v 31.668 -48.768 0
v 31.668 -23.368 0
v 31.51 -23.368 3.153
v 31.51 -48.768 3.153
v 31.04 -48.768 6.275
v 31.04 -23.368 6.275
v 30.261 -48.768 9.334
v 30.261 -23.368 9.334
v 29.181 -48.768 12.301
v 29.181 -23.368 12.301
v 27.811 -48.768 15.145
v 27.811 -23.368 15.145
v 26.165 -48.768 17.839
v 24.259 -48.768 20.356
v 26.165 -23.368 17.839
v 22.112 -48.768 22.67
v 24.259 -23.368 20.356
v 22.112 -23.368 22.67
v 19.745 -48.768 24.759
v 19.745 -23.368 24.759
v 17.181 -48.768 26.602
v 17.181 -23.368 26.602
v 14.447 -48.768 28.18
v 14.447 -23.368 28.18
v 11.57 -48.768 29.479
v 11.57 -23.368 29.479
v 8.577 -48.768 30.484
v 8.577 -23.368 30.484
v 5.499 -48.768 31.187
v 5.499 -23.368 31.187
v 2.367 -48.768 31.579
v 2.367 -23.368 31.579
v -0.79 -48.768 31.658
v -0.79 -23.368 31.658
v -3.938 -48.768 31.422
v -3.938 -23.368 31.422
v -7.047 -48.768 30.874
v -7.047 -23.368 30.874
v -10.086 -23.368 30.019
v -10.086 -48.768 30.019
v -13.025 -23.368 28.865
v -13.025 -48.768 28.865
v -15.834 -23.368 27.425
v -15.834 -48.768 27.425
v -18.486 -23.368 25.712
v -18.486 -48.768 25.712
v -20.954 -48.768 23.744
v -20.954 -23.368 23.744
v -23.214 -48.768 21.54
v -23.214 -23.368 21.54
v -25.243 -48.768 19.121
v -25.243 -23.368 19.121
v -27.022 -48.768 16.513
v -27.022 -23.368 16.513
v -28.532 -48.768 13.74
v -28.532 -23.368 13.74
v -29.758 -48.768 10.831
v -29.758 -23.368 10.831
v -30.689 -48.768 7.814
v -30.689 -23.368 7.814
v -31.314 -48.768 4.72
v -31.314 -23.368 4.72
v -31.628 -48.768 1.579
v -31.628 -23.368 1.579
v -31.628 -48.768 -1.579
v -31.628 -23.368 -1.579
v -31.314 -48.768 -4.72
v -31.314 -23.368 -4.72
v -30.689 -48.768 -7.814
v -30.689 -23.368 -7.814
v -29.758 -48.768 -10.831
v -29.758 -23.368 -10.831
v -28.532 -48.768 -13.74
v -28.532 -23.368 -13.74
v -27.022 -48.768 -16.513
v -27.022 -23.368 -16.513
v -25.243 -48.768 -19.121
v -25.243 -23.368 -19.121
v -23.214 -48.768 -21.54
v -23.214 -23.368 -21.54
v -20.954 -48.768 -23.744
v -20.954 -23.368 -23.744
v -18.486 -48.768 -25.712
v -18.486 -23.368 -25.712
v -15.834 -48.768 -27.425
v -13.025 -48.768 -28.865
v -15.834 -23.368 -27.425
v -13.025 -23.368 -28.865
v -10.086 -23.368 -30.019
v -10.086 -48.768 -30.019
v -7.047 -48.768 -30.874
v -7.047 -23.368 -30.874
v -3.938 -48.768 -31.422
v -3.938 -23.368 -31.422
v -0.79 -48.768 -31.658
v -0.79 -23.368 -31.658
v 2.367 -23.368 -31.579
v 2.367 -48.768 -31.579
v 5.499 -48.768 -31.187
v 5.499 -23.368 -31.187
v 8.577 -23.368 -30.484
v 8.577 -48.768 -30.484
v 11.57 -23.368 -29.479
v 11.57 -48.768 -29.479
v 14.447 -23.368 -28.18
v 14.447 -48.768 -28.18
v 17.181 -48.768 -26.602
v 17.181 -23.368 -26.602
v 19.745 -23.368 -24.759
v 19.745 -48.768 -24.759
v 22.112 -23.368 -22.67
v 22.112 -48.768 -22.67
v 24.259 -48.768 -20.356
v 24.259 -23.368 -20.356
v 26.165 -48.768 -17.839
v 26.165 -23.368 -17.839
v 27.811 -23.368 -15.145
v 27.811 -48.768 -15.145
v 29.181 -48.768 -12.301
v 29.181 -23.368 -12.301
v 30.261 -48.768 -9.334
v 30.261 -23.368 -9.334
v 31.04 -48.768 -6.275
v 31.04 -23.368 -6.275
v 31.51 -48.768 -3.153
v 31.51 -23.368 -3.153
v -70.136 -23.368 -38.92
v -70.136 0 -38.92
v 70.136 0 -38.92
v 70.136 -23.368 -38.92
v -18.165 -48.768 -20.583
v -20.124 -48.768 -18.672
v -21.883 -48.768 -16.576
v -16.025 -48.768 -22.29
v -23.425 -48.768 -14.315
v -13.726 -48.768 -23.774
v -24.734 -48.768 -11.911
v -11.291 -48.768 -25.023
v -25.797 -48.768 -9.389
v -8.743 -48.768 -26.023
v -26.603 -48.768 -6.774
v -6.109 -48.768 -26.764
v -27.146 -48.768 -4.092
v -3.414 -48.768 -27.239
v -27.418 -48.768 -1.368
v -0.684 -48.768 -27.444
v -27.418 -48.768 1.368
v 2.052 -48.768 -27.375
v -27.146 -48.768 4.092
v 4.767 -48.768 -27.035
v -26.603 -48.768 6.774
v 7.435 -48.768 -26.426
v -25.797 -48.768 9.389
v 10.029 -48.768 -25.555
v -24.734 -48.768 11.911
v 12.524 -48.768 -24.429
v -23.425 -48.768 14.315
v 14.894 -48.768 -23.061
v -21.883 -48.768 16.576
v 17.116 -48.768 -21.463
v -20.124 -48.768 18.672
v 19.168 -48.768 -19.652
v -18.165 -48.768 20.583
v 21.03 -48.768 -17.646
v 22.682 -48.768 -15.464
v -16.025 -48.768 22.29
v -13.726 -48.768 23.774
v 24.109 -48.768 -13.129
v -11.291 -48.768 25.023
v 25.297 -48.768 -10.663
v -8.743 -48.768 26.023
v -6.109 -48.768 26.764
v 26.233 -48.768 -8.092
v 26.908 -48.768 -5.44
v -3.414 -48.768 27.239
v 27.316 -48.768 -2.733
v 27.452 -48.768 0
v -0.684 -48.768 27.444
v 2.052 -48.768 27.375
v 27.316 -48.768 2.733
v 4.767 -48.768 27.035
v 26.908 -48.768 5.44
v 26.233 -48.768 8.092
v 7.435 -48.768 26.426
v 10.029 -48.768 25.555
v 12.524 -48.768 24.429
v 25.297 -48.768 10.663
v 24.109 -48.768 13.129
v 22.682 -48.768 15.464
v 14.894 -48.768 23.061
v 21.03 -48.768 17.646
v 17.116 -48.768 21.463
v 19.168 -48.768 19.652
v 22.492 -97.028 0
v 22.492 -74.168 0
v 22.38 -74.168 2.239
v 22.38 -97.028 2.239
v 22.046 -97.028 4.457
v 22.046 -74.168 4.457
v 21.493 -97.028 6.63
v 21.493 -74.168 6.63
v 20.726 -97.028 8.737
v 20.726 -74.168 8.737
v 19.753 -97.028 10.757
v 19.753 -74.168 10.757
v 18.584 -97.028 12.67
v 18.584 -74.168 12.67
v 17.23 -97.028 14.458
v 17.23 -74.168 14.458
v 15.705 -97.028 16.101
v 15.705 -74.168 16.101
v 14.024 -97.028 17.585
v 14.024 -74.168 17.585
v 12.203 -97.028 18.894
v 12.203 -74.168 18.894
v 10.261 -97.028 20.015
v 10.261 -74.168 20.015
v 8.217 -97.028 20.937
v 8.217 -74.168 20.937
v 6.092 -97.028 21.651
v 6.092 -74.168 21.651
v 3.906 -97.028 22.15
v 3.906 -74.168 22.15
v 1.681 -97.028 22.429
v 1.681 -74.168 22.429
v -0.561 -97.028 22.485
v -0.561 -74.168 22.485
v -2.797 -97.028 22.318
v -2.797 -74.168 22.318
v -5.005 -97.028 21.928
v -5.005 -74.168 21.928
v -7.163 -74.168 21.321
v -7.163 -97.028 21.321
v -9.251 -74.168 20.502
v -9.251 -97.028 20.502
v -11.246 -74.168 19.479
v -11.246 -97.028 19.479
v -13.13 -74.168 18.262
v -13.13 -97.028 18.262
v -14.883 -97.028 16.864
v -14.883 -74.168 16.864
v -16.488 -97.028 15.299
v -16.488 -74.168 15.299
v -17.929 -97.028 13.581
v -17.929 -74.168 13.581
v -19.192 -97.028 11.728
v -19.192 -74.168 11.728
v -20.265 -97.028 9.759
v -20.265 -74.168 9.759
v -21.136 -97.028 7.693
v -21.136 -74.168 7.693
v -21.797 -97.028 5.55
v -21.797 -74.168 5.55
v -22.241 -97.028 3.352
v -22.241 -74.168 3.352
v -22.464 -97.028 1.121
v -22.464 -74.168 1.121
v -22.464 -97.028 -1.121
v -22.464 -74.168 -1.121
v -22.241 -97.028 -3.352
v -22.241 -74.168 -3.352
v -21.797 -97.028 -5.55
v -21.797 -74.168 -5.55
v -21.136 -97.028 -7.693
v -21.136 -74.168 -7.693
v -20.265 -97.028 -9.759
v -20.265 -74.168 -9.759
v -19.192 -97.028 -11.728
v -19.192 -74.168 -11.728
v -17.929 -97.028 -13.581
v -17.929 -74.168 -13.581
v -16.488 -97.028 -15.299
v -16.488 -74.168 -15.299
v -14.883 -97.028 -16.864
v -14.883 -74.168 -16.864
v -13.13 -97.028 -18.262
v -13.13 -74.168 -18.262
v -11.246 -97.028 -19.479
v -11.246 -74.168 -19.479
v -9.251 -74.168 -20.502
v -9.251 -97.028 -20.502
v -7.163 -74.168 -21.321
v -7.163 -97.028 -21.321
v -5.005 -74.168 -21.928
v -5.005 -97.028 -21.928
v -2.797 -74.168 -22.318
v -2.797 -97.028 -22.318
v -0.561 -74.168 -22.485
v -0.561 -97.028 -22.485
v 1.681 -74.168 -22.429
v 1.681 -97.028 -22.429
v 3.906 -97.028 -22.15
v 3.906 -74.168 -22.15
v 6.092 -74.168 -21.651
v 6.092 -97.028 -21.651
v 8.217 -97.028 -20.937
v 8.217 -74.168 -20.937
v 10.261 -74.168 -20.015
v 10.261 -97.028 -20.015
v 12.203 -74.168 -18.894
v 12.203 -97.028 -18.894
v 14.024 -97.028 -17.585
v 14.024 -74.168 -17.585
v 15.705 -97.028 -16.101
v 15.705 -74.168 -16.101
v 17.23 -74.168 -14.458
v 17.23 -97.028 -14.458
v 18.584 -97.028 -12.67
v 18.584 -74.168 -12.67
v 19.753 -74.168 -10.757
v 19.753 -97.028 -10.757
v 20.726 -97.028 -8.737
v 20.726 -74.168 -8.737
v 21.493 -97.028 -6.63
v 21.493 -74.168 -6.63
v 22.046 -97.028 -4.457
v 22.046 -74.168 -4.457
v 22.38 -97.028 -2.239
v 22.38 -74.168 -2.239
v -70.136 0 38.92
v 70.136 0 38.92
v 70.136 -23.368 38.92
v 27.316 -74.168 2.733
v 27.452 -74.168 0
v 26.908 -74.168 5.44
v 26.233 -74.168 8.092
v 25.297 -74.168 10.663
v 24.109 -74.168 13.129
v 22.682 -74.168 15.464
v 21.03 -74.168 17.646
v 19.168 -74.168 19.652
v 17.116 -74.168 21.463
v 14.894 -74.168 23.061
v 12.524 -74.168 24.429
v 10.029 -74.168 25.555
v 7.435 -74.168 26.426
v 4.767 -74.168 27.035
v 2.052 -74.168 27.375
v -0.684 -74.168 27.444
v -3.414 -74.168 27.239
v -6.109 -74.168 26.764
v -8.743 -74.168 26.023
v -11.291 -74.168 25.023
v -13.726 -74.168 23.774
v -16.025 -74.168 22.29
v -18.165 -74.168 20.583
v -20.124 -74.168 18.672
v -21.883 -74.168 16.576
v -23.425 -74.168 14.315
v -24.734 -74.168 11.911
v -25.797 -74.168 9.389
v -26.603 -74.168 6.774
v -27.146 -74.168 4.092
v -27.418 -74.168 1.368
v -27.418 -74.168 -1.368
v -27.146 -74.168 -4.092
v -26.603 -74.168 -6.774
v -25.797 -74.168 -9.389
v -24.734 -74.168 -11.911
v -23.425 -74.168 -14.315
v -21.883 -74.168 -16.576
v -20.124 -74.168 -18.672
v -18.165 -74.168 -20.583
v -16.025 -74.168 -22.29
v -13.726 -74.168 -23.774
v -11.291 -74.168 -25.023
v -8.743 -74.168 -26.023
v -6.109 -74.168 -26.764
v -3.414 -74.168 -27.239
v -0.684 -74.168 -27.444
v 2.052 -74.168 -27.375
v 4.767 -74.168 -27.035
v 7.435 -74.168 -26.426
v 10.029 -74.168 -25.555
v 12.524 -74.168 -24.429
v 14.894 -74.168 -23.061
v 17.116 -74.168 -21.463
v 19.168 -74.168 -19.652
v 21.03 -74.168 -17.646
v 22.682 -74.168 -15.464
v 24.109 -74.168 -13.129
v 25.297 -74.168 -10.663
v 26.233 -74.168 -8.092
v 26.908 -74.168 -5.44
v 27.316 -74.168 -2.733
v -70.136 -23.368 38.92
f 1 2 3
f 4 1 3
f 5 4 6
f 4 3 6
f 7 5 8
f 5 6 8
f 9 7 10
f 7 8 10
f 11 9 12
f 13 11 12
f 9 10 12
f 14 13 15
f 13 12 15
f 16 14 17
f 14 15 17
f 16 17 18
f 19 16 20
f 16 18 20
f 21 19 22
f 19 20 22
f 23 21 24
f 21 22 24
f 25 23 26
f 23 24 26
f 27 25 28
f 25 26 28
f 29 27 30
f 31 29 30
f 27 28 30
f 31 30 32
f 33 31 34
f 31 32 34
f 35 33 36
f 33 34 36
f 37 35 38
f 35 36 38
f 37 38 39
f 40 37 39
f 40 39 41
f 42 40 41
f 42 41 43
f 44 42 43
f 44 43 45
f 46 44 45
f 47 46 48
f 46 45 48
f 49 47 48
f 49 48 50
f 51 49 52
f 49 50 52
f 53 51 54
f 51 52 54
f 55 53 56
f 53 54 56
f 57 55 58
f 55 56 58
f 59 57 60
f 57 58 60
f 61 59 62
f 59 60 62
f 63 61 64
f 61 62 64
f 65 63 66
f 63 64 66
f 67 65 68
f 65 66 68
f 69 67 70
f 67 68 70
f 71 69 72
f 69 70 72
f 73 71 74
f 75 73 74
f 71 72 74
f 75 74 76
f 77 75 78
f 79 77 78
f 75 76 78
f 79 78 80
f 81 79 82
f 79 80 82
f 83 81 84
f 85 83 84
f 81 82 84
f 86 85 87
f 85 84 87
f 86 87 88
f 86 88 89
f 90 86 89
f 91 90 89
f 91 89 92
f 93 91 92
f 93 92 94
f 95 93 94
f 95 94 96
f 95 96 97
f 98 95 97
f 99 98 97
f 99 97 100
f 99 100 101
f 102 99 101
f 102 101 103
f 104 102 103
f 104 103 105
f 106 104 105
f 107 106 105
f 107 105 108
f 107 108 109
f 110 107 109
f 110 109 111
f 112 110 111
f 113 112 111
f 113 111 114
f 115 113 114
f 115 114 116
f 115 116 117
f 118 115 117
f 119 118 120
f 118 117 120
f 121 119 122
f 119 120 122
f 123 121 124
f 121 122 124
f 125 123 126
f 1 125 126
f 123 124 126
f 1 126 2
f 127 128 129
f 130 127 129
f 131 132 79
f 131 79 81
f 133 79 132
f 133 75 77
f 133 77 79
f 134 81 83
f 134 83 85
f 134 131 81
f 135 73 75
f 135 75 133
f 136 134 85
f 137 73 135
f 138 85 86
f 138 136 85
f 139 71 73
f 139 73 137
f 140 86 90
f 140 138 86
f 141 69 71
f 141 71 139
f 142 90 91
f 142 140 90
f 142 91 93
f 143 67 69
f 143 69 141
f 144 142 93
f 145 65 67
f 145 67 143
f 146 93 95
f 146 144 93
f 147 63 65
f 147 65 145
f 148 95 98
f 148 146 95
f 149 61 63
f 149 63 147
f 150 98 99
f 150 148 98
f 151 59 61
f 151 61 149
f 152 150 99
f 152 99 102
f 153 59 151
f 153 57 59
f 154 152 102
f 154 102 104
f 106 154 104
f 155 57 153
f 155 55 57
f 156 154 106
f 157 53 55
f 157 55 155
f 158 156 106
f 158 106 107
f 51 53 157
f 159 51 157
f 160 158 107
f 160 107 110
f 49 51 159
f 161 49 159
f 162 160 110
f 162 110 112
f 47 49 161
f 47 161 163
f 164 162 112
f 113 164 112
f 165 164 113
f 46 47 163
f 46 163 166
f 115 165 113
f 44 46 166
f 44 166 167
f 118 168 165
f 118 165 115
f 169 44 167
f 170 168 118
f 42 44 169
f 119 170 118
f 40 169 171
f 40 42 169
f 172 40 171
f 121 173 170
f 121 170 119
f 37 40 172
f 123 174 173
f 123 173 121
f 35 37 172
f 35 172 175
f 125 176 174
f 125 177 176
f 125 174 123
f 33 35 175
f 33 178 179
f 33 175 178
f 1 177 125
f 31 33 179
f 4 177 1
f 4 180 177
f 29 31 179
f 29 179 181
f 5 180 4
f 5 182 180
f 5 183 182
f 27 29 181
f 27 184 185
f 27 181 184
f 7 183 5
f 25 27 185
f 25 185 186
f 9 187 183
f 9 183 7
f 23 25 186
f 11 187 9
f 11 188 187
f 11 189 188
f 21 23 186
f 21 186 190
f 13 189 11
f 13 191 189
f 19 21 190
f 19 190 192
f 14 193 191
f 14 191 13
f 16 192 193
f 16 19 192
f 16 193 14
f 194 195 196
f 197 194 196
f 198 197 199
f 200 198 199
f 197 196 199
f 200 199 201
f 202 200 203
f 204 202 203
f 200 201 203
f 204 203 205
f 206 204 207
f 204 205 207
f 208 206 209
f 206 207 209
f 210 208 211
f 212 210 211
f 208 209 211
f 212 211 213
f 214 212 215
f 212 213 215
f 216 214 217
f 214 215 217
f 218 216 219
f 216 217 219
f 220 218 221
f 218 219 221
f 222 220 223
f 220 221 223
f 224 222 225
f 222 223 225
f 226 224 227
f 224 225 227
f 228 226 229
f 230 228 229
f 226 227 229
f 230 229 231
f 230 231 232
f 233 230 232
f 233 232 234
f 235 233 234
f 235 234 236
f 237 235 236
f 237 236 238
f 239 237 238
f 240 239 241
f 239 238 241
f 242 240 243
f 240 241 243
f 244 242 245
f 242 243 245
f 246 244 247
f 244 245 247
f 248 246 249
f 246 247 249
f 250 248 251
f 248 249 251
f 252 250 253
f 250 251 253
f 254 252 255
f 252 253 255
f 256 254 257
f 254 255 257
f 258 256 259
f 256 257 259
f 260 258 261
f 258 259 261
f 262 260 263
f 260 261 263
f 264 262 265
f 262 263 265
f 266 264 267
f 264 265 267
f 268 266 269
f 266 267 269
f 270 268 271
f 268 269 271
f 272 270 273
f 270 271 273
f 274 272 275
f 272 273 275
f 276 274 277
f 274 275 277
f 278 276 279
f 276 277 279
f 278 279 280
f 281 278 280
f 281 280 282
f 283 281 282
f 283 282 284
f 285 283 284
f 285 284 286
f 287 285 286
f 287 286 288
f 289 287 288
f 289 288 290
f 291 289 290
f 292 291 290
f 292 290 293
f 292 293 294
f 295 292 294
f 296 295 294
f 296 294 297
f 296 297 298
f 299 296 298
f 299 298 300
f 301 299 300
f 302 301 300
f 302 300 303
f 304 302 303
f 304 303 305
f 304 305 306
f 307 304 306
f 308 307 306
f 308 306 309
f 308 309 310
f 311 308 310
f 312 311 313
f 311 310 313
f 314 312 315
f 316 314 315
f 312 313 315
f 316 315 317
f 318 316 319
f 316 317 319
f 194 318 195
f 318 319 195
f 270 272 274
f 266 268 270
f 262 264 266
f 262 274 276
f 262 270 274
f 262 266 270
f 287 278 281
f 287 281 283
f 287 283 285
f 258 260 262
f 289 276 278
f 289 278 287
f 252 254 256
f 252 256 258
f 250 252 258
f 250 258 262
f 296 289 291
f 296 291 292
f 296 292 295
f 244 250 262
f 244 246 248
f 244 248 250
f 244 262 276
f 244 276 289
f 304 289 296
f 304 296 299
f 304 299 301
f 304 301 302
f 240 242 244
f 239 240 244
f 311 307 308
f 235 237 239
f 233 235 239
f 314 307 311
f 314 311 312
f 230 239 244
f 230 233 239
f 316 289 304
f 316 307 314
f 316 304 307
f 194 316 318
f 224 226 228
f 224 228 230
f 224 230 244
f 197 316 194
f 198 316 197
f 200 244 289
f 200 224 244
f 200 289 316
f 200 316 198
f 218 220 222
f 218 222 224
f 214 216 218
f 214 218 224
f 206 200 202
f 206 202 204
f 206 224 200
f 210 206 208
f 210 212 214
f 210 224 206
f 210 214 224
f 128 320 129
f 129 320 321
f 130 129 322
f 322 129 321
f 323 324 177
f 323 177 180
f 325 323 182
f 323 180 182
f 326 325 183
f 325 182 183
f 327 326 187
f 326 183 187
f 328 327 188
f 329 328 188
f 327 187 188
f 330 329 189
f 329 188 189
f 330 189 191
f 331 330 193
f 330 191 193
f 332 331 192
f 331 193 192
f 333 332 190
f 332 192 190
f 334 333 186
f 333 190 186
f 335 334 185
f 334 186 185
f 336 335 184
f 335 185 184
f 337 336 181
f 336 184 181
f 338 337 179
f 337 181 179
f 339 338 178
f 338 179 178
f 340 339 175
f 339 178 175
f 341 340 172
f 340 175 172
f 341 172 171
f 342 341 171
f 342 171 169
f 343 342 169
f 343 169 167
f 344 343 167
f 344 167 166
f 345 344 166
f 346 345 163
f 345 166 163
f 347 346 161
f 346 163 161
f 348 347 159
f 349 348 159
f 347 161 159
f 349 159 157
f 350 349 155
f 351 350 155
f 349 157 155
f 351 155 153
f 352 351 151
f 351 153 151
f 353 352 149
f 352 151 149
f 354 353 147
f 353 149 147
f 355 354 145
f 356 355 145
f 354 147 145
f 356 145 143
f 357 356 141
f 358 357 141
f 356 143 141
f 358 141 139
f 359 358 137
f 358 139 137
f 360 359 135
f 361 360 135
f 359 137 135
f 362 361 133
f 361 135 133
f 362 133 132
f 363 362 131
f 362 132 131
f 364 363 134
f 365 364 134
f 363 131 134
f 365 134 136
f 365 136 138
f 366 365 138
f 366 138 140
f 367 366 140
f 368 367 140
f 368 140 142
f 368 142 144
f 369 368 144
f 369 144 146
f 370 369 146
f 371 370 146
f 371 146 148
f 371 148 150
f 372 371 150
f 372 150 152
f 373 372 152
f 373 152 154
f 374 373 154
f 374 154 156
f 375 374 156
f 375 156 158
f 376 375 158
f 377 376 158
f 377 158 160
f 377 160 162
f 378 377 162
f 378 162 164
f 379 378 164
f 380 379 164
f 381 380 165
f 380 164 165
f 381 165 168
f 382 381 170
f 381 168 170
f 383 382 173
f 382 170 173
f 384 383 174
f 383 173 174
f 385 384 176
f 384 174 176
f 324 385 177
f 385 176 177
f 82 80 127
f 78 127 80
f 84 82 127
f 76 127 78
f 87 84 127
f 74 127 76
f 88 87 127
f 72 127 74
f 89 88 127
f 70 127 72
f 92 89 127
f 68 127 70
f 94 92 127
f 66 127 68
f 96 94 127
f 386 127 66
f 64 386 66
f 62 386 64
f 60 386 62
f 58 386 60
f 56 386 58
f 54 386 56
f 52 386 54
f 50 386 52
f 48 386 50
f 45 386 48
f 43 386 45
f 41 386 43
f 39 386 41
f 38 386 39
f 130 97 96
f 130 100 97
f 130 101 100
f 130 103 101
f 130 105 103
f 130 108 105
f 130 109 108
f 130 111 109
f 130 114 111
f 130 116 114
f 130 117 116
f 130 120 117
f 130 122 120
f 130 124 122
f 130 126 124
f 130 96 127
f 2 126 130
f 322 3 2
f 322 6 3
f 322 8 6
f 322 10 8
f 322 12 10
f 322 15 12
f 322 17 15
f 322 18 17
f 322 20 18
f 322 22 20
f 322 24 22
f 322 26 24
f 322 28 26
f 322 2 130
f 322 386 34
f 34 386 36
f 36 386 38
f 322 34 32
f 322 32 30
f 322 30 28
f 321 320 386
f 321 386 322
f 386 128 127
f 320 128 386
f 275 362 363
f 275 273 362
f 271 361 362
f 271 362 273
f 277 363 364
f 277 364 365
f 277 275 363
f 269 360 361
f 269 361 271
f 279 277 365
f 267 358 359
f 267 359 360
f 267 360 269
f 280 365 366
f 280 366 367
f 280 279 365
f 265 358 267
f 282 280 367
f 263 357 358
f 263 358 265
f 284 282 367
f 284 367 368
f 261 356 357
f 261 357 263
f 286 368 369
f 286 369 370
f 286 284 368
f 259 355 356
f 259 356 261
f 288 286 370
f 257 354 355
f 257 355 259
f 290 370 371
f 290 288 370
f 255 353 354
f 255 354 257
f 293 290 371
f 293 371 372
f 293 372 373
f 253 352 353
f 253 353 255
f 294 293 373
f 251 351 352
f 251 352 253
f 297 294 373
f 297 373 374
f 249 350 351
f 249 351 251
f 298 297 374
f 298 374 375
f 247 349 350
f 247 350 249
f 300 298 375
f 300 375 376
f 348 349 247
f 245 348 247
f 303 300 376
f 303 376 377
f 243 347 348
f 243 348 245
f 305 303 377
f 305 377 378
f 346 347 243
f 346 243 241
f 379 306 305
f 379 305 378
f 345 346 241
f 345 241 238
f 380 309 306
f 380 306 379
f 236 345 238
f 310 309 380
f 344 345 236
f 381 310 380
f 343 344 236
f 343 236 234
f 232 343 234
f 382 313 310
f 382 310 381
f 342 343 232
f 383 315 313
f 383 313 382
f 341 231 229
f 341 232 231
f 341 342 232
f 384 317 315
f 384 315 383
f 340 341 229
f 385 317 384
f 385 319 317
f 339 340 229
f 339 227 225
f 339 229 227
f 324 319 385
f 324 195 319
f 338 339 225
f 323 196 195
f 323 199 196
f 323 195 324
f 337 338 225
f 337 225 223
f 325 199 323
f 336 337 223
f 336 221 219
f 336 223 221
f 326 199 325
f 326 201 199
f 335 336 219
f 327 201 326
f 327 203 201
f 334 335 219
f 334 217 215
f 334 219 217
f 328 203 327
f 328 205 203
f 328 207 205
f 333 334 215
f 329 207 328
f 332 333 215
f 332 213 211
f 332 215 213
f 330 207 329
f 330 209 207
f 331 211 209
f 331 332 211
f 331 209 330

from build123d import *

# Parameters (mm, degrees)
F0_W     = 140.272602
F0_H     = 77.840932
F1_DEPTH = 23.368
F2_R     = 31.667864
F3_DEPTH = 25.4
F4_R     = 27.452249
F5_DEPTH = 25.4
F6_R     = 22.492116
F7_DEPTH = 22.86


with BuildPart() as f1:
    # F0 (on Front) → F1 (new body)
    with BuildSketch(Plane.XZ):
        Rectangle(F0_W, F0_H)
    extrude(amount=F1_DEPTH)

    # F2 (on face) → F3 (join)
    with BuildSketch(Plane.XZ.offset(23.368)):
        Circle(F2_R)
    extrude(amount=F3_DEPTH)

    # F4 (on face) → F5 (join)
    with BuildSketch(Plane.XZ.offset(48.768)):
        Circle(F4_R)
    extrude(amount=F5_DEPTH)

    # F6 (on face) → F7 (join)
    with BuildSketch(Plane.XZ.offset(74.168)):
        Circle(F6_R)
    extrude(amount=F7_DEPTH)


solid = f1.part
